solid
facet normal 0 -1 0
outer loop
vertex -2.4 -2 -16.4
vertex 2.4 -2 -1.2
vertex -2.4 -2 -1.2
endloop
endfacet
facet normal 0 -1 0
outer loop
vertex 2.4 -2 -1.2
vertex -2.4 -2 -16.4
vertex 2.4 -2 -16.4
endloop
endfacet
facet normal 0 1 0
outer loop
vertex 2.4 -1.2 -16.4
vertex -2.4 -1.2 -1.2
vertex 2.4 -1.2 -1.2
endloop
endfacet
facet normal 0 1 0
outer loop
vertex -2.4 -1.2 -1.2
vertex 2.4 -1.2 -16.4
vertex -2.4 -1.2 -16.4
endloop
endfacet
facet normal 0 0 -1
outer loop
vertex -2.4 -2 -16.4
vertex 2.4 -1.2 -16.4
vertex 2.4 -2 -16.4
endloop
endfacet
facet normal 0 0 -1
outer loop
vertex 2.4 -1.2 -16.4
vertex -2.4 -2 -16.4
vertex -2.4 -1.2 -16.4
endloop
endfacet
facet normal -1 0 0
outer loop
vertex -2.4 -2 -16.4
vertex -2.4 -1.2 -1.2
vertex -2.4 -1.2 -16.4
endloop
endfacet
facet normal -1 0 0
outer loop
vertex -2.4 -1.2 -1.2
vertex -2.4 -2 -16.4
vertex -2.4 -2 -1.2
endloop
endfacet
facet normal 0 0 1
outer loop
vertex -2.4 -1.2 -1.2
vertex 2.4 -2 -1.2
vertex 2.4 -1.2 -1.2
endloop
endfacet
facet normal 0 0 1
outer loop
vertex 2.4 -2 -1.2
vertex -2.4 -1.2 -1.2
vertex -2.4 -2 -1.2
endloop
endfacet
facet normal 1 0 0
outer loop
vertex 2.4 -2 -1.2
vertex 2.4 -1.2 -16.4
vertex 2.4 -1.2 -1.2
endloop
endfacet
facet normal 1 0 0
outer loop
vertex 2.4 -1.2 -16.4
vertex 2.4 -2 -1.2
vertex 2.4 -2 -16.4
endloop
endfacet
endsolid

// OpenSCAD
// file: ../p/box.scad
use <../lib.scad>
function ldraw_lib__box() = [
// 0 Box 6 (six faces)
// 0 Name: box.dat
// 0 Author: James Jessiman
// 0 !LDRAW_ORG Primitive UPDATE 2002-05
// 0 !LICENSE Licensed under CC BY 2.0 and CC BY 4.0 : see CAreadme.txt
// 
// 0 BFC CERTIFY CCW
  [0,"BFC","CERTIFY"],
  [0,"BFC","CCW"],
// 
// 0 !HISTORY 2002-08-22 [sbliss] Applied BFC
// 0 !HISTORY 2002-11-30 [PTadmin] Official Update 2002-05
// 0 !HISTORY 2007-06-24 [PTadmin] Header formatted for Contributor Agreement
// 0 !HISTORY 2008-07-01 [PTadmin] Official Update 2008-01
// 
// 
// 2 24 1 1 1 -1 1 1
  [2,24,1,1,1,-1,1,1],
// 2 24 -1 1 1 -1 1 -1
  [2,24,-1,1,1,-1,1,-1],
// 2 24 -1 1 -1 1 1 -1
  [2,24,-1,1,-1,1,1,-1],
// 2 24 1 1 -1 1 1 1
  [2,24,1,1,-1,1,1,1],
// 2 24 1 -1 1 -1 -1 1
  [2,24,1,-1,1,-1,-1,1],
// 2 24 -1 -1 1 -1 -1 -1
  [2,24,-1,-1,1,-1,-1,-1],
// 2 24 -1 -1 -1 1 -1 -1
  [2,24,-1,-1,-1,1,-1,-1],
// 2 24 1 -1 -1 1 -1 1
  [2,24,1,-1,-1,1,-1,1],
// 2 24 1 -1 1 1 1 1
  [2,24,1,-1,1,1,1,1],
// 2 24 -1 -1 1 -1 1 1
  [2,24,-1,-1,1,-1,1,1],
// 2 24 1 -1 -1 1 1 -1
  [2,24,1,-1,-1,1,1,-1],
// 2 24 -1 -1 -1 -1 1 -1
  [2,24,-1,-1,-1,-1,1,-1],
// 4 16 1 1 1 1 1 -1 -1 1 -1 -1 1 1
  [4,16,1,1,1,1,1,-1,-1,1,-1,-1,1,1],
// 4 16 -1 -1 -1 1 -1 -1 1 -1 1 -1 -1 1
  [4,16,-1,-1,-1,1,-1,-1,1,-1,1,-1,-1,1],
// 4 16 -1 -1 1 1 -1 1 1 1 1 -1 1 1
  [4,16,-1,-1,1,1,-1,1,1,1,1,-1,1,1],
// 4 16 -1 -1 -1 -1 -1 1 -1 1 1 -1 1 -1
  [4,16,-1,-1,-1,-1,-1,1,-1,1,1,-1,1,-1],
// 4 16 1 -1 -1 -1 -1 -1 -1 1 -1 1 1 -1
  [4,16,1,-1,-1,-1,-1,-1,-1,1,-1,1,1,-1],
// 4 16 1 -1 1 1 -1 -1 1 1 -1 1 1 1
  [4,16,1,-1,1,1,-1,-1,1,1,-1,1,1,1],
// 0
];
makepoly(ldraw_lib__box(), line=0.2);
// main file
use <../lib.scad>
use <../p/box.scad>
function ldraw_lib__845() = [
// 0 ~Window  1 x  1 x  2 Classic Glass
// 0 Name: 845.dat
// 0 Author: Tore Eriksson [Tore_Eriksson]
// 0 !LDRAW_ORG Part UPDATE 2009-01
// 0 !LICENSE Licensed under CC BY 2.0 and CC BY 4.0 : see CAreadme.txt
// 
// 0 BFC CERTIFY CCW
  [0,"BFC","CERTIFY"],
  [0,"BFC","CCW"],
// 
// 0 !HISTORY 2006-04-17 [cwdee] Secondary author
// 0 !HISTORY 2009-05-02 [PTadmin] Official Update 2009-01
// 
// 
// 1 16 0 22 -4 6 0 0 0 0 19 0 -1 0 box.dat
  [1,16,0,22,-4,6,0,0,0,0,19,0,-1,0, ldraw_lib__box()],
// 0
// 
];
makepoly(ldraw_lib__845(), line=0.2);
